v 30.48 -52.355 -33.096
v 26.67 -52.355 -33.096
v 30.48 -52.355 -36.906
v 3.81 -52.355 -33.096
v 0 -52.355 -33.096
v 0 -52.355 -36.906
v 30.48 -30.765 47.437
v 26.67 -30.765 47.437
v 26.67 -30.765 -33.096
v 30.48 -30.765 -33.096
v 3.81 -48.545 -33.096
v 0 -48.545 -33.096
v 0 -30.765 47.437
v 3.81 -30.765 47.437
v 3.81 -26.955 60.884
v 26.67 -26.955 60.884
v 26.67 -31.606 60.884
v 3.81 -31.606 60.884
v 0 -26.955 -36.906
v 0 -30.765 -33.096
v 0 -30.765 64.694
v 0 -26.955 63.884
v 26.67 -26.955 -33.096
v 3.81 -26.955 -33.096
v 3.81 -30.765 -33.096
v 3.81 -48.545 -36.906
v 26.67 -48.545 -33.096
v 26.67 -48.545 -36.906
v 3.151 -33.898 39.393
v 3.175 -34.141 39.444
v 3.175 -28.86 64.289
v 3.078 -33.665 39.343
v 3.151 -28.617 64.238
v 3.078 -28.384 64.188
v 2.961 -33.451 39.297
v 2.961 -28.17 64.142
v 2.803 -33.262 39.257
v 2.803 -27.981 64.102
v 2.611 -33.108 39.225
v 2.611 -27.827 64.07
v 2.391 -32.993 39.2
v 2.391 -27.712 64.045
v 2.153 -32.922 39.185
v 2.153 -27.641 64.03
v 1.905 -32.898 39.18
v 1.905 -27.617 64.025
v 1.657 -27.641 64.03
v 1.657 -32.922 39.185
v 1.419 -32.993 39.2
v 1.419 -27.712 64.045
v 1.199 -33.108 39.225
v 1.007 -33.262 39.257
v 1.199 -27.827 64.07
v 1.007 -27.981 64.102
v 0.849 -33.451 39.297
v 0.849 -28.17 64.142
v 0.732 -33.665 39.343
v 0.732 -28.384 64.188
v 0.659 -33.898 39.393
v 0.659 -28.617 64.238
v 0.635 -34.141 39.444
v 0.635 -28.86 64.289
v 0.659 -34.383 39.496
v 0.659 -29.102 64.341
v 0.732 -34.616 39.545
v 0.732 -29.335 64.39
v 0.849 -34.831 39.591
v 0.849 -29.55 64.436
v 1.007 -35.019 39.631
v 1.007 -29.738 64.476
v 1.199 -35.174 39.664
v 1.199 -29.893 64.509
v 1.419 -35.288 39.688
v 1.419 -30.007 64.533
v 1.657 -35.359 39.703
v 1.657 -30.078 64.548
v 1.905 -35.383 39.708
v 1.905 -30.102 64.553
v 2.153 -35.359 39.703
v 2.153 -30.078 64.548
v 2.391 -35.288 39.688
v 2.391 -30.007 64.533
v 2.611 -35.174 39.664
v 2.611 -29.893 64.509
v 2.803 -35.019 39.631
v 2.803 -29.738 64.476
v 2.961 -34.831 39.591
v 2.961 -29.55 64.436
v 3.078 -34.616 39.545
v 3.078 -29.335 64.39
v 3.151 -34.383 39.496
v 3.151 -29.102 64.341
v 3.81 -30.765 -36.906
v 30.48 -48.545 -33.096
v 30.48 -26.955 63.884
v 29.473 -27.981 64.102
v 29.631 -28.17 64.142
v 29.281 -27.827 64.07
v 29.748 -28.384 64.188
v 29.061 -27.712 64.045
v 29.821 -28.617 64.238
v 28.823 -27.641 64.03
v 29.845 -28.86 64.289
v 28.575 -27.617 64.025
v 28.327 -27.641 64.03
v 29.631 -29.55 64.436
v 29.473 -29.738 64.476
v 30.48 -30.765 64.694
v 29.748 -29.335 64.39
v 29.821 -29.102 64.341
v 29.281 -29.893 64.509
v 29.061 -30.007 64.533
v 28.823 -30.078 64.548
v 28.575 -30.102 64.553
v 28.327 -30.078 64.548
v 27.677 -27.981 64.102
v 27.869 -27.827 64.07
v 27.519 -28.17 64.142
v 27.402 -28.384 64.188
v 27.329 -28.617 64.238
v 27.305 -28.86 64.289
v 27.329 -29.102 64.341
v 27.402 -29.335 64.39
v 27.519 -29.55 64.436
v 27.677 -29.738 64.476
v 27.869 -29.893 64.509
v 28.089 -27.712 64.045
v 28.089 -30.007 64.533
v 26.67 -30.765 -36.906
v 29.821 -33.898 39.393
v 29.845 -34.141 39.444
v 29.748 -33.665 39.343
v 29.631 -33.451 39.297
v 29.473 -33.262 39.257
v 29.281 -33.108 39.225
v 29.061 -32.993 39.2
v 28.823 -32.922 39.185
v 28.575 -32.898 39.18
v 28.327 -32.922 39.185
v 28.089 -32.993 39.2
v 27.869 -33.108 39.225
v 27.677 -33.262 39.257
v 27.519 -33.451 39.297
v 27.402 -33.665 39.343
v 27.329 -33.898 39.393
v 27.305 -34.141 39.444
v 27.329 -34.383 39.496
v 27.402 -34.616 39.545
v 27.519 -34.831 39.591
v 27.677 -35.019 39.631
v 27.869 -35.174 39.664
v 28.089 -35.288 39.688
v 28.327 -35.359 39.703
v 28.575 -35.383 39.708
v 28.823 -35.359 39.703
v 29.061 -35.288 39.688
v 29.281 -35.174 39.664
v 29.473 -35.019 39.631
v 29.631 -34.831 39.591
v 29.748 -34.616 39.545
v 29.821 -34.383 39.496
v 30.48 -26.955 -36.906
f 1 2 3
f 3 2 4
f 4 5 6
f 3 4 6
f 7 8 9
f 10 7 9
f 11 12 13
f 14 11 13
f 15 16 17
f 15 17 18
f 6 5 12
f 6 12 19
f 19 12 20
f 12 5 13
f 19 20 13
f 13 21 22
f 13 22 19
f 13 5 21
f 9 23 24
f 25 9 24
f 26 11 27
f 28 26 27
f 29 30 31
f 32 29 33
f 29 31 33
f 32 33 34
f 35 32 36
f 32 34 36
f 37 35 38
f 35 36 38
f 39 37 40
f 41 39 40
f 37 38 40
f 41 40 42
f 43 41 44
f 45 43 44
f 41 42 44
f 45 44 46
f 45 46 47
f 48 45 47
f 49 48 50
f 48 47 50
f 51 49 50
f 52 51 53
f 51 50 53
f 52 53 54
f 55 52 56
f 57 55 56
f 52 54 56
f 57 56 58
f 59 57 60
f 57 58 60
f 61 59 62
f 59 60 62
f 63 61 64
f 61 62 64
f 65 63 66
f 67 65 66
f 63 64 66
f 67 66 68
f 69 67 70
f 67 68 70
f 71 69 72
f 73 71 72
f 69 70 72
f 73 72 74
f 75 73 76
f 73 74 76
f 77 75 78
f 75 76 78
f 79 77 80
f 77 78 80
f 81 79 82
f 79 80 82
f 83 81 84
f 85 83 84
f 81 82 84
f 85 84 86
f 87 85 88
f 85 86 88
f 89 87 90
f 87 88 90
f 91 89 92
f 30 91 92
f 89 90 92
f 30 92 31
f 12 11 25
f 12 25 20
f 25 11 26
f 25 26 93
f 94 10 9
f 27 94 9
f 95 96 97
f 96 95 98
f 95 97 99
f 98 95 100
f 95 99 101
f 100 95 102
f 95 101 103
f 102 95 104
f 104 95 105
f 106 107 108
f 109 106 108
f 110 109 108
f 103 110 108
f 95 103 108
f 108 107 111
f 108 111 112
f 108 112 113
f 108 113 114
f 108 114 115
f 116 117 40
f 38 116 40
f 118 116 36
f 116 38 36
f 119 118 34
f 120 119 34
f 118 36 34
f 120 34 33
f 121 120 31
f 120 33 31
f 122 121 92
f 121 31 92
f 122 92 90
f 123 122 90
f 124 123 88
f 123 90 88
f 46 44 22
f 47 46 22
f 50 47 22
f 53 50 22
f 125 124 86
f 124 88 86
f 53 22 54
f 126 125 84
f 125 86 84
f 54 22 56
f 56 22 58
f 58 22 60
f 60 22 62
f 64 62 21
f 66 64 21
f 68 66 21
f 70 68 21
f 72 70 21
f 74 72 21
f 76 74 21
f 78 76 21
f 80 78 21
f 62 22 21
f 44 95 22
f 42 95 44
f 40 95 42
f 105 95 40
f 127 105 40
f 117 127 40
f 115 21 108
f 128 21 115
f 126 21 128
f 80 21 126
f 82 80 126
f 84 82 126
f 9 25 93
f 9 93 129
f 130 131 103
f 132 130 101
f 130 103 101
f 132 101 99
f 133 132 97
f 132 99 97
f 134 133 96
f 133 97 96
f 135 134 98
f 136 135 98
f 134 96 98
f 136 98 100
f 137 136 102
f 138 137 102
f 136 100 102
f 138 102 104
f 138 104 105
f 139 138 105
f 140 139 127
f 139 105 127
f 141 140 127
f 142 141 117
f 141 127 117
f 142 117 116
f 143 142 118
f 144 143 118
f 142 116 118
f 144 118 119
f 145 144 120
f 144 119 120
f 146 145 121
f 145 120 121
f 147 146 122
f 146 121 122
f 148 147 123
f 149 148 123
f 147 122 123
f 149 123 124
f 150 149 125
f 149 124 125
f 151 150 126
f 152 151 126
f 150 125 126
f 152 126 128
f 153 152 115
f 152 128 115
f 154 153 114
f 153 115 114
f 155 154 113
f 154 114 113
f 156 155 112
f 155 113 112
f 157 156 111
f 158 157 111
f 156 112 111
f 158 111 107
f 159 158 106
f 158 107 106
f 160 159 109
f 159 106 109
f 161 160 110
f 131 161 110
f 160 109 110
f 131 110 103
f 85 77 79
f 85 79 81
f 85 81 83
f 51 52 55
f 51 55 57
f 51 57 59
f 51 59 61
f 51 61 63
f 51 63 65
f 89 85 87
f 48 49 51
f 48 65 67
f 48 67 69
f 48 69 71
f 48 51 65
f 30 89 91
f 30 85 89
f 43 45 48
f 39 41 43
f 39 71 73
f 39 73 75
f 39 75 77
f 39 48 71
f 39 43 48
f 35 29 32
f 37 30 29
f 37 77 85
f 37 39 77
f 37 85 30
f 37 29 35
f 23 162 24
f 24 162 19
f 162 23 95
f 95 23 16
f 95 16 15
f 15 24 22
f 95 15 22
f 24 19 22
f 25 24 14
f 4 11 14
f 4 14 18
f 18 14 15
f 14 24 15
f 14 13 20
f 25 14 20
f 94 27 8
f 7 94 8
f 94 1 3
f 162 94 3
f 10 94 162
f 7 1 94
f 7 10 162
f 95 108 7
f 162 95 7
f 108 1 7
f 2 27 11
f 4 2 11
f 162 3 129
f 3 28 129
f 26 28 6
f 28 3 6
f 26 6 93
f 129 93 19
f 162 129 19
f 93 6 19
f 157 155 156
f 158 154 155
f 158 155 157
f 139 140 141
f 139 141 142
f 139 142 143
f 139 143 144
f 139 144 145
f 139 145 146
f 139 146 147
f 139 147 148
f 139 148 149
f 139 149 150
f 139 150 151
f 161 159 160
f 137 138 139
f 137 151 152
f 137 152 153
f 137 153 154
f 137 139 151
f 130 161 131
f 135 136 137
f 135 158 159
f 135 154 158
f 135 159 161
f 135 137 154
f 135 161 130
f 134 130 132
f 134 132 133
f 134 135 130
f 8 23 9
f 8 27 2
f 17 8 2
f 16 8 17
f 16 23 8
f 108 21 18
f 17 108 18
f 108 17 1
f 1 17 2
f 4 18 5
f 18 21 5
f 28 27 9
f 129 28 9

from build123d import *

# Parameters (mm, degrees)
F1_DEPTH = 30.48
F2_W     = 22.86
F2_H     = 93.98
F3_DEPTH = 25.4
F4_W     = 22.86
F4_H     = 17.78
F5_DEPTH = 25.4
F7_DEPTH = 50.8
F8_R     = 1.27
F9_DEPTH = 25.4


with BuildPart() as f1:
    # F0 (on Right) → F1 (new body)
    with BuildSketch(Plane.YZ):
        Polygon((-30.7647287846, 64.6939707769), (-52.3547287846, -33.0960292231), (-48.5447287846, -33.0960292231), (-30.7647287846, 47.4369119534), align=None)
        Polygon((-52.3547287846, -33.0960292231), (-52.3547287846, -36.9060292231), (-26.9547287846, -36.9060292231), (-26.9547287846, -33.0960292231), (-30.7647287846, -33.0960292231), (-48.5447287846, -33.0960292231), align=None)
        Polygon((-30.7647287846, -33.0960292231), (-26.9547287846, -33.0960292231), (-26.9547287846, 64.6939707769), (-30.7647287846, 47.4369119534), align=None)
        Polygon((-26.9547287846, 64.6939707769), (-30.7647287846, 64.6939707769), (-30.7647287846, 47.4369119534), align=None)
    extrude(amount=F1_DEPTH)

    # F2 (on face) → F3 (cut)
    with BuildSketch(Plane(origin=(0, -26.9547287846, 0), x_dir=(-1, 0, 0), z_dir=(0, 1, 0))):
        with Locations((-15.24, 13.8939707769)):
            Rectangle(F2_W, F2_H)
    extrude(amount=-F3_DEPTH, mode=Mode.SUBTRACT)

    # F4 (on face) → F5 (cut)
    with BuildSketch(Plane.XY.offset(-33.0960292231)):
        with Locations((15.24, -39.6547287846)):
            Rectangle(F4_W, F4_H)
    extrude(amount=-F5_DEPTH, mode=Mode.SUBTRACT)

    # F6 (on face) → F7 (cut)
    with BuildSketch(Plane(origin=(0, 0, 0), x_dir=(0, -1, 0), z_dir=(-1, 0, 0))):
        Polygon((26.9547287846, 63.8841302769), (30.7647287846, 64.6939707769), (26.9547287846, 64.6939707769), align=None)
    extrude(amount=-F7_DEPTH, mode=Mode.SUBTRACT)

    # F8 (on face) → F9 (cut)
    with BuildSketch(Plane(origin=(0, 11.8268289766, 55.640855703), x_dir=(1, 0, 0), z_dir=(0, 0.2079116908, 0.9781476007))):
        with Locations((28.575, -41.5955196646)):
            Circle(F8_R)
        with Locations((1.905, -41.5955196646)):
            Circle(F8_R)
    extrude(amount=-F9_DEPTH, mode=Mode.SUBTRACT)


solid = f1.part
